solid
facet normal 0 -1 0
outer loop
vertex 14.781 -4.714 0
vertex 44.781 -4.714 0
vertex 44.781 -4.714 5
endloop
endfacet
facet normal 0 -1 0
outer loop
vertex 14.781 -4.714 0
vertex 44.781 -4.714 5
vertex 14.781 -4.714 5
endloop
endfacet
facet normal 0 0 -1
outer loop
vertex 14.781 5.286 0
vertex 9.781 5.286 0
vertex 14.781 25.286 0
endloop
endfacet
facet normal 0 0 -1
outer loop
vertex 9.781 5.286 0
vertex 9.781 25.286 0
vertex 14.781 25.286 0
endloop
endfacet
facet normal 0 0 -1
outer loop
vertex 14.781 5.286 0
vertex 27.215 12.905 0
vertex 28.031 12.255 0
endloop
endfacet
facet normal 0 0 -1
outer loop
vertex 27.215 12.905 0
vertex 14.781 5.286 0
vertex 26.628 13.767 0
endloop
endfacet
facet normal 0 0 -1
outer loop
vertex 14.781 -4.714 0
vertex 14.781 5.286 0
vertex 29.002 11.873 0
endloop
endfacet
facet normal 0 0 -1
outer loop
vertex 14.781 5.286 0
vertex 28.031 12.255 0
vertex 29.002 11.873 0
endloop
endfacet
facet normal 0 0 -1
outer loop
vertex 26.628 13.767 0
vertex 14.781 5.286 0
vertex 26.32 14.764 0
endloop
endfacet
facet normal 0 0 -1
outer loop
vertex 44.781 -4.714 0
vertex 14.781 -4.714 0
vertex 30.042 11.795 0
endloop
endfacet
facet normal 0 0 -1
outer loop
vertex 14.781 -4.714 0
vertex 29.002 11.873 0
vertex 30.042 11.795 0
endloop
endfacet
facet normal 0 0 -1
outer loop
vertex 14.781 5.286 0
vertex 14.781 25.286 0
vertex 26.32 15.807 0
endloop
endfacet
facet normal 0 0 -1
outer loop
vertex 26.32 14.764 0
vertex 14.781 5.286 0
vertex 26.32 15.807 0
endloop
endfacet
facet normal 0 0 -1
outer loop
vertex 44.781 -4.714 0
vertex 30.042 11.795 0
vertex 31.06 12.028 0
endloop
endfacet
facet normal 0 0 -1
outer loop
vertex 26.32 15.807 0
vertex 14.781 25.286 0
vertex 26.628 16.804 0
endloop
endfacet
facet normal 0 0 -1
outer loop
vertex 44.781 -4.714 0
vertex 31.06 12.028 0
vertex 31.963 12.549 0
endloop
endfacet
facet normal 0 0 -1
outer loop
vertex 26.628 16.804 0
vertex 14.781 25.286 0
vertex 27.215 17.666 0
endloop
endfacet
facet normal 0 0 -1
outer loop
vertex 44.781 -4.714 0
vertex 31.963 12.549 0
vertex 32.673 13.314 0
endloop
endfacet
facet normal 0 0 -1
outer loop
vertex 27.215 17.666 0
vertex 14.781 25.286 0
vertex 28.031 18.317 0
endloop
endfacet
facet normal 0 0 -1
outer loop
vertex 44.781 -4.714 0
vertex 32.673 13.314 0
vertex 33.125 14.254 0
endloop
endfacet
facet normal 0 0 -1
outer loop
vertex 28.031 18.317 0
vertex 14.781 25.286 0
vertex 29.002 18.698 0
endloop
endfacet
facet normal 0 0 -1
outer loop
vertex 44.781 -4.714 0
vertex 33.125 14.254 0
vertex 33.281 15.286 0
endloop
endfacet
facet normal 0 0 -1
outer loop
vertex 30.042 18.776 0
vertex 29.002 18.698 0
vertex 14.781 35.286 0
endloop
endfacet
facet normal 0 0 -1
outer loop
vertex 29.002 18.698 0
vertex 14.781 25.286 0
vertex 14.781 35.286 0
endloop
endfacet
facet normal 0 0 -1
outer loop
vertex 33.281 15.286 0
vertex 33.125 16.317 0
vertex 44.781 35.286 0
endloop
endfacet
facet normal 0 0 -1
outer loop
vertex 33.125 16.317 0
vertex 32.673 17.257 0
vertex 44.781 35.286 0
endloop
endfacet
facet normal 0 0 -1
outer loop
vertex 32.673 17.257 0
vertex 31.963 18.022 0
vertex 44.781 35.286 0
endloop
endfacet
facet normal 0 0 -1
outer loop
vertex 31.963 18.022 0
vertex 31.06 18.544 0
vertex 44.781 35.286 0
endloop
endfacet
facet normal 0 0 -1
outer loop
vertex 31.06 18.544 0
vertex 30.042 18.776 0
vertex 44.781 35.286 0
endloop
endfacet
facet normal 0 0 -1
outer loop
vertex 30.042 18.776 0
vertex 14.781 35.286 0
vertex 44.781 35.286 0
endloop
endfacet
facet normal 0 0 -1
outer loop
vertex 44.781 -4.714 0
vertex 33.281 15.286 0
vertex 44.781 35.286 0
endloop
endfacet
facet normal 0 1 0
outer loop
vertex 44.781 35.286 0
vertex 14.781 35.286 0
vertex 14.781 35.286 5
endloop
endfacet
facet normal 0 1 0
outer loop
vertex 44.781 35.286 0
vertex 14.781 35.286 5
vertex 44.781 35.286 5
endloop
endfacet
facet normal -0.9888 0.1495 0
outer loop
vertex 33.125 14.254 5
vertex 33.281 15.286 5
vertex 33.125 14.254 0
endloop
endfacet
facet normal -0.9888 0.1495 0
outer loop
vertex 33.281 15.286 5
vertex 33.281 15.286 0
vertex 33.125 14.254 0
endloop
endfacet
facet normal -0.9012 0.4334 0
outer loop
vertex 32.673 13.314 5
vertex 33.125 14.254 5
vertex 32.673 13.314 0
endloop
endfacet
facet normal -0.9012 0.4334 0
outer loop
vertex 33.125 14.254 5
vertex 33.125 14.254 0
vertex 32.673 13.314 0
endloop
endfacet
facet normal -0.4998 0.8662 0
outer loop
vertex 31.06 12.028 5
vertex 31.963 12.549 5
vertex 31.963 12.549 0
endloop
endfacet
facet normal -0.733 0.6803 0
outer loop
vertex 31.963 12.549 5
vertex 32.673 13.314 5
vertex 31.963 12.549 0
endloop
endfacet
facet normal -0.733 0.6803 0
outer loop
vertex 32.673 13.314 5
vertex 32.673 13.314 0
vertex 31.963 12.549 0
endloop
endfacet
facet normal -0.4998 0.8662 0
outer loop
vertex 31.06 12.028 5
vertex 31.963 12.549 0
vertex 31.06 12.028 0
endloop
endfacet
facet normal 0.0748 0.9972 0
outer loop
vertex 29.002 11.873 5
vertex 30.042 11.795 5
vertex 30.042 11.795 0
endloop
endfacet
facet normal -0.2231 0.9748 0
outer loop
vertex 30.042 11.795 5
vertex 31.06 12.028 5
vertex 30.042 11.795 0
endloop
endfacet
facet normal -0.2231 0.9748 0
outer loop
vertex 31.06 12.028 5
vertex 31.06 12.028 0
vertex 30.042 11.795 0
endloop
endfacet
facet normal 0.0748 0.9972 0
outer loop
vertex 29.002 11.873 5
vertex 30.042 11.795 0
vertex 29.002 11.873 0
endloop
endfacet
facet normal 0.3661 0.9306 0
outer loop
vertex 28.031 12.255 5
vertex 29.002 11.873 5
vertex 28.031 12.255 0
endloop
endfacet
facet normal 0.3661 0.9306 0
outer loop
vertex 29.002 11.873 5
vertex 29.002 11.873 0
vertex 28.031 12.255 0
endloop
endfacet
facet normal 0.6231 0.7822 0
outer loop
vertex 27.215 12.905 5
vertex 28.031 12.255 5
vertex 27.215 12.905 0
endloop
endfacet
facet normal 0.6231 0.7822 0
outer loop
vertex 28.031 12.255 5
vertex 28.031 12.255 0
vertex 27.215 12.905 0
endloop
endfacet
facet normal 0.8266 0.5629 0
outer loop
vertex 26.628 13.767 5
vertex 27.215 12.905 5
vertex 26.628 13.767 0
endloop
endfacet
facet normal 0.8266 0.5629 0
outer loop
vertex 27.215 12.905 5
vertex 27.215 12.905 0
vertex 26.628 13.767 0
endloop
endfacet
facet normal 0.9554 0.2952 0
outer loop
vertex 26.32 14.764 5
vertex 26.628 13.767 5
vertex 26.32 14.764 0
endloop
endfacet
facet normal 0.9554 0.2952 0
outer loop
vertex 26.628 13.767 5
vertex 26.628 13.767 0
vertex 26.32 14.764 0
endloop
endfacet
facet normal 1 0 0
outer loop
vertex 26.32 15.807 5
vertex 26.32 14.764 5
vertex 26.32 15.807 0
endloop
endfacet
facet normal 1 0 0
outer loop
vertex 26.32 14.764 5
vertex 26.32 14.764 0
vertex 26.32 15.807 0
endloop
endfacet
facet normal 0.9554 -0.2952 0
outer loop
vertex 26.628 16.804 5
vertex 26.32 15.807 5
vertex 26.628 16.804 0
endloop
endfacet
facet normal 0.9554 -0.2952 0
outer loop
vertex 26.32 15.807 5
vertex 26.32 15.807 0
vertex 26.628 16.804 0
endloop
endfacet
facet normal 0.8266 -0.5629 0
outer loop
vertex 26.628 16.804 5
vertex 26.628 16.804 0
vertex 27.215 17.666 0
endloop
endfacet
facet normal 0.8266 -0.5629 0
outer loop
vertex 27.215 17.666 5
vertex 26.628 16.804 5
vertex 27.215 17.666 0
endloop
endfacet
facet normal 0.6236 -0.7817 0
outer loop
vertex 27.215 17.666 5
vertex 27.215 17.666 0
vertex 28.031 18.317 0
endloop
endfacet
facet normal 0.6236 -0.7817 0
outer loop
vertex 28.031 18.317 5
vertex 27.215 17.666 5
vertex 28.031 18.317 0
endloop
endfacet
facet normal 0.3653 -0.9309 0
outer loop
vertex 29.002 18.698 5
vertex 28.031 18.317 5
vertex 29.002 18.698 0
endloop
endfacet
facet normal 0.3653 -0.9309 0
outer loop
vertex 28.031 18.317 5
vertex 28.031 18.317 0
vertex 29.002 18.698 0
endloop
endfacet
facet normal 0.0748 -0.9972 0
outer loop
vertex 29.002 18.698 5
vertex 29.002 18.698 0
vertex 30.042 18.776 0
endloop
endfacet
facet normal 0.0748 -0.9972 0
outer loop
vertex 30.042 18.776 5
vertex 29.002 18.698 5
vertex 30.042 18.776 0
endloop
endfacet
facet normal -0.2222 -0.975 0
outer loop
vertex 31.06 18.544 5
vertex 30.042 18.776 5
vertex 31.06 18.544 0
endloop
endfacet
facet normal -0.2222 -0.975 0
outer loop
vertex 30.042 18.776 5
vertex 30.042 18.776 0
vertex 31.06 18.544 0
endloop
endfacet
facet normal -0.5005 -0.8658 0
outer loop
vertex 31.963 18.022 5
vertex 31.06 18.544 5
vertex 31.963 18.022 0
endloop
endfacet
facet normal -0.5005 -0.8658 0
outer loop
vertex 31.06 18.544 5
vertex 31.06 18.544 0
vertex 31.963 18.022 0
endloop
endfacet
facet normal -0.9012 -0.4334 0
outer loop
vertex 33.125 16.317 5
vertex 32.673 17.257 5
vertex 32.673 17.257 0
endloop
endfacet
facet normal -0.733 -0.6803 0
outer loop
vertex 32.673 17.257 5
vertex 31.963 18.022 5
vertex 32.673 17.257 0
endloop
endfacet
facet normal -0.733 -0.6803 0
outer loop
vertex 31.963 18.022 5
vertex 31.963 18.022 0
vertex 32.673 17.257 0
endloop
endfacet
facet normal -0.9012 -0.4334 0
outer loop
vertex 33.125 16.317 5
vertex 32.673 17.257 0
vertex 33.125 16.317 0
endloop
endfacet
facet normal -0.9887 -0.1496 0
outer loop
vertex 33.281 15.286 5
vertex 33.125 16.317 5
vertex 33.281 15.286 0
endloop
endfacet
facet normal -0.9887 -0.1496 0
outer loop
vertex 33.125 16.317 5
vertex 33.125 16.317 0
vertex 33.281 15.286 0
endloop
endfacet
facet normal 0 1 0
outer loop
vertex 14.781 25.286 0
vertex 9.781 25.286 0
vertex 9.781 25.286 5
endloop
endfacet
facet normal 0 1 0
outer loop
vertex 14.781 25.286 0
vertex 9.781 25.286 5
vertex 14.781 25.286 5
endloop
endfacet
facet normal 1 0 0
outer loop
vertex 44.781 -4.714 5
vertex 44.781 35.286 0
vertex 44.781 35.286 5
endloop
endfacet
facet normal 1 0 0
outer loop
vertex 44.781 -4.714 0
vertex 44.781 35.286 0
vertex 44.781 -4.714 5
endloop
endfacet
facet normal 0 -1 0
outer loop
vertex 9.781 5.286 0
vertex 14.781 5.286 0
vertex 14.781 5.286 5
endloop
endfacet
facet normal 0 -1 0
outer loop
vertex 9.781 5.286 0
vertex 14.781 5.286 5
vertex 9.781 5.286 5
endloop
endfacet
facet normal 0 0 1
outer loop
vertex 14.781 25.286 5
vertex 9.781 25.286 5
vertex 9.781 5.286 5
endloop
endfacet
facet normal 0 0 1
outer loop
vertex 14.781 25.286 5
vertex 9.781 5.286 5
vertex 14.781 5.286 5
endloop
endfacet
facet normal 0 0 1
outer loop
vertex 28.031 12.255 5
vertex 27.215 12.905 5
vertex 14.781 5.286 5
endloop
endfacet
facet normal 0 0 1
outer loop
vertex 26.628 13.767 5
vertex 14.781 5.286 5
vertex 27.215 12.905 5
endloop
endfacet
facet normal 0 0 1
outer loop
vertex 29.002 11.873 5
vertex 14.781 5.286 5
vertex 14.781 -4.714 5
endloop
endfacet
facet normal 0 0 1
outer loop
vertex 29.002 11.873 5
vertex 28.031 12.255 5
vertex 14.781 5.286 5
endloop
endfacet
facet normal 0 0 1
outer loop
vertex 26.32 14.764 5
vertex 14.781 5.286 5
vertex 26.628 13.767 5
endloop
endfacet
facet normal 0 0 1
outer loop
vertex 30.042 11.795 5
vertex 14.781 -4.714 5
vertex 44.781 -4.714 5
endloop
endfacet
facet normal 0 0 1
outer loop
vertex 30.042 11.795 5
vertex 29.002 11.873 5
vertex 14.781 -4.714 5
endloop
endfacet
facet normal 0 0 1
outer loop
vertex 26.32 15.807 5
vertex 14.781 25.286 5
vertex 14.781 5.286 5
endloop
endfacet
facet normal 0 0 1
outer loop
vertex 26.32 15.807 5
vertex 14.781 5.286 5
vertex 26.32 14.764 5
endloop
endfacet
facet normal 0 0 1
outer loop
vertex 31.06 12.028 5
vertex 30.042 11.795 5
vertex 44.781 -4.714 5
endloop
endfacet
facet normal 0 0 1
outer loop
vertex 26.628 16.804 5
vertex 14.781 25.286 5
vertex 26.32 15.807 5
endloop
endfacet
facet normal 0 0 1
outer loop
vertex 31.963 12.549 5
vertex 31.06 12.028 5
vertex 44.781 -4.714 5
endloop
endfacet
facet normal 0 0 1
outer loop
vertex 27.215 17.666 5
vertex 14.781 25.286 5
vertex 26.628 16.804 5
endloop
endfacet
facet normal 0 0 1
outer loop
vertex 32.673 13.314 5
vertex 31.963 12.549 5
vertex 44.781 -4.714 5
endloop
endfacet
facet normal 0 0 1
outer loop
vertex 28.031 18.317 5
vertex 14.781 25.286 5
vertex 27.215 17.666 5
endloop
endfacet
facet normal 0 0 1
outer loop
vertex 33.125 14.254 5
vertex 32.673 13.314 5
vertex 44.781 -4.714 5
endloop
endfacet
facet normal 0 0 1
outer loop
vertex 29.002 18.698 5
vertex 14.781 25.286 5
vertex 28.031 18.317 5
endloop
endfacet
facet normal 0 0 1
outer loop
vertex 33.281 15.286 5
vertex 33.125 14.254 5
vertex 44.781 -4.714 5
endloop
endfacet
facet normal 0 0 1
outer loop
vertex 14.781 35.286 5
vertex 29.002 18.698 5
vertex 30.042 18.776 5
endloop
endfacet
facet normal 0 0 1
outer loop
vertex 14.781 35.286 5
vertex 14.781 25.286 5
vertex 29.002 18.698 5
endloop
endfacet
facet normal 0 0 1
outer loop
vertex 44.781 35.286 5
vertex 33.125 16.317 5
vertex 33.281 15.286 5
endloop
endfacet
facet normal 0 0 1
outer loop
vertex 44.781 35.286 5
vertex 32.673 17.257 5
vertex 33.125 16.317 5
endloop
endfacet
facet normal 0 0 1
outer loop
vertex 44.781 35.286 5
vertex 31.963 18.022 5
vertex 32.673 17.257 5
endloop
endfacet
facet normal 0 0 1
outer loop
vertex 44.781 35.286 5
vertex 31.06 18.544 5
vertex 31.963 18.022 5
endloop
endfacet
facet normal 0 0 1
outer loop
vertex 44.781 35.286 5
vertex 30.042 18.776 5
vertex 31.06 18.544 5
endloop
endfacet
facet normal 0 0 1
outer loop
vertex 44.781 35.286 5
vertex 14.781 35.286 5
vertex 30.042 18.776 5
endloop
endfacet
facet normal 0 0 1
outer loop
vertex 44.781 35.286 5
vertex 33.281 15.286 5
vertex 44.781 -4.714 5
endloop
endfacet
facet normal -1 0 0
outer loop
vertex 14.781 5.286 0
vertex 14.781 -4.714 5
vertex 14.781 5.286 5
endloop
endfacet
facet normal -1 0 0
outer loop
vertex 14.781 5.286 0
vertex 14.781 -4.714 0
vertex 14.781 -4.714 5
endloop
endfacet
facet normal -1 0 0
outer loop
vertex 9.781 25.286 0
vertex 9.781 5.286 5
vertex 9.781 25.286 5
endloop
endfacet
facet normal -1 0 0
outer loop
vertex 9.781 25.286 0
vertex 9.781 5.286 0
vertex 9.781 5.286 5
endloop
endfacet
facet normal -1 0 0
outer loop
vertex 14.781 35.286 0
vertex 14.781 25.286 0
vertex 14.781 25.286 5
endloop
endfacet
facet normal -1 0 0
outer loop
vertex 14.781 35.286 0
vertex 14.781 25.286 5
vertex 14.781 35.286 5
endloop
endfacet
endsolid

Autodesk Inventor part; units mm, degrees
ref_plane "YZ Plane" through (0, 0, 0) normal (1, 0, 0) x (0, 1, 0)
ref_plane "XZ Plane" through (0, 0, 0) normal (0, 1, 0) x (-1, 0, 0)
ref_plane "XY Plane" through (0, 0, 0) normal (0, 0, 1) x (1, 0, 0)
sketch "Sketch1" plane through (0, 0, 0) normal (0, 0, 1) x (1, 0, 0)
  line L0 (9.7809, 25.2857) -> (14.7809, 25.2857)
  line L1 (14.7809, 25.2857) -> (14.7809, 5.2857)
  line L2 (14.7809, 5.2857) -> (9.7809, 5.2857)
  line L3 (9.7809, 5.2857) -> (9.7809, 25.2857)
  line L4 (14.7809, 35.2857) -> (44.7809, 35.2857)
  line L5 (44.7809, 35.2857) -> (44.7809, -4.7143)
  line L6 (44.7809, -4.7143) -> (14.7809, -4.7143)
  line L7 (14.7809, -4.7143) -> (14.7809, 35.2857)
  circle A0 centre (29.7809, 15.2857) radius 3.5
  point P0 (0, 0)
  point P1 (12.2809, 25.2857)
  dimension "d0" = 5
  dimension "d1" = 20
  dimension "d2" = 30
  dimension "d3" = 40
  dimension "d4" = 10
  dimension "d7" = 7
extrude "Extrusion1" add sketch "Sketch1" along normal blind 5 contours L0 L1 L2 L3 | L7 L4 L5 L6 L1 | A0
extrude "Extrusion2" cut sketch "Sketch1" along normal blind 5 contours A0
